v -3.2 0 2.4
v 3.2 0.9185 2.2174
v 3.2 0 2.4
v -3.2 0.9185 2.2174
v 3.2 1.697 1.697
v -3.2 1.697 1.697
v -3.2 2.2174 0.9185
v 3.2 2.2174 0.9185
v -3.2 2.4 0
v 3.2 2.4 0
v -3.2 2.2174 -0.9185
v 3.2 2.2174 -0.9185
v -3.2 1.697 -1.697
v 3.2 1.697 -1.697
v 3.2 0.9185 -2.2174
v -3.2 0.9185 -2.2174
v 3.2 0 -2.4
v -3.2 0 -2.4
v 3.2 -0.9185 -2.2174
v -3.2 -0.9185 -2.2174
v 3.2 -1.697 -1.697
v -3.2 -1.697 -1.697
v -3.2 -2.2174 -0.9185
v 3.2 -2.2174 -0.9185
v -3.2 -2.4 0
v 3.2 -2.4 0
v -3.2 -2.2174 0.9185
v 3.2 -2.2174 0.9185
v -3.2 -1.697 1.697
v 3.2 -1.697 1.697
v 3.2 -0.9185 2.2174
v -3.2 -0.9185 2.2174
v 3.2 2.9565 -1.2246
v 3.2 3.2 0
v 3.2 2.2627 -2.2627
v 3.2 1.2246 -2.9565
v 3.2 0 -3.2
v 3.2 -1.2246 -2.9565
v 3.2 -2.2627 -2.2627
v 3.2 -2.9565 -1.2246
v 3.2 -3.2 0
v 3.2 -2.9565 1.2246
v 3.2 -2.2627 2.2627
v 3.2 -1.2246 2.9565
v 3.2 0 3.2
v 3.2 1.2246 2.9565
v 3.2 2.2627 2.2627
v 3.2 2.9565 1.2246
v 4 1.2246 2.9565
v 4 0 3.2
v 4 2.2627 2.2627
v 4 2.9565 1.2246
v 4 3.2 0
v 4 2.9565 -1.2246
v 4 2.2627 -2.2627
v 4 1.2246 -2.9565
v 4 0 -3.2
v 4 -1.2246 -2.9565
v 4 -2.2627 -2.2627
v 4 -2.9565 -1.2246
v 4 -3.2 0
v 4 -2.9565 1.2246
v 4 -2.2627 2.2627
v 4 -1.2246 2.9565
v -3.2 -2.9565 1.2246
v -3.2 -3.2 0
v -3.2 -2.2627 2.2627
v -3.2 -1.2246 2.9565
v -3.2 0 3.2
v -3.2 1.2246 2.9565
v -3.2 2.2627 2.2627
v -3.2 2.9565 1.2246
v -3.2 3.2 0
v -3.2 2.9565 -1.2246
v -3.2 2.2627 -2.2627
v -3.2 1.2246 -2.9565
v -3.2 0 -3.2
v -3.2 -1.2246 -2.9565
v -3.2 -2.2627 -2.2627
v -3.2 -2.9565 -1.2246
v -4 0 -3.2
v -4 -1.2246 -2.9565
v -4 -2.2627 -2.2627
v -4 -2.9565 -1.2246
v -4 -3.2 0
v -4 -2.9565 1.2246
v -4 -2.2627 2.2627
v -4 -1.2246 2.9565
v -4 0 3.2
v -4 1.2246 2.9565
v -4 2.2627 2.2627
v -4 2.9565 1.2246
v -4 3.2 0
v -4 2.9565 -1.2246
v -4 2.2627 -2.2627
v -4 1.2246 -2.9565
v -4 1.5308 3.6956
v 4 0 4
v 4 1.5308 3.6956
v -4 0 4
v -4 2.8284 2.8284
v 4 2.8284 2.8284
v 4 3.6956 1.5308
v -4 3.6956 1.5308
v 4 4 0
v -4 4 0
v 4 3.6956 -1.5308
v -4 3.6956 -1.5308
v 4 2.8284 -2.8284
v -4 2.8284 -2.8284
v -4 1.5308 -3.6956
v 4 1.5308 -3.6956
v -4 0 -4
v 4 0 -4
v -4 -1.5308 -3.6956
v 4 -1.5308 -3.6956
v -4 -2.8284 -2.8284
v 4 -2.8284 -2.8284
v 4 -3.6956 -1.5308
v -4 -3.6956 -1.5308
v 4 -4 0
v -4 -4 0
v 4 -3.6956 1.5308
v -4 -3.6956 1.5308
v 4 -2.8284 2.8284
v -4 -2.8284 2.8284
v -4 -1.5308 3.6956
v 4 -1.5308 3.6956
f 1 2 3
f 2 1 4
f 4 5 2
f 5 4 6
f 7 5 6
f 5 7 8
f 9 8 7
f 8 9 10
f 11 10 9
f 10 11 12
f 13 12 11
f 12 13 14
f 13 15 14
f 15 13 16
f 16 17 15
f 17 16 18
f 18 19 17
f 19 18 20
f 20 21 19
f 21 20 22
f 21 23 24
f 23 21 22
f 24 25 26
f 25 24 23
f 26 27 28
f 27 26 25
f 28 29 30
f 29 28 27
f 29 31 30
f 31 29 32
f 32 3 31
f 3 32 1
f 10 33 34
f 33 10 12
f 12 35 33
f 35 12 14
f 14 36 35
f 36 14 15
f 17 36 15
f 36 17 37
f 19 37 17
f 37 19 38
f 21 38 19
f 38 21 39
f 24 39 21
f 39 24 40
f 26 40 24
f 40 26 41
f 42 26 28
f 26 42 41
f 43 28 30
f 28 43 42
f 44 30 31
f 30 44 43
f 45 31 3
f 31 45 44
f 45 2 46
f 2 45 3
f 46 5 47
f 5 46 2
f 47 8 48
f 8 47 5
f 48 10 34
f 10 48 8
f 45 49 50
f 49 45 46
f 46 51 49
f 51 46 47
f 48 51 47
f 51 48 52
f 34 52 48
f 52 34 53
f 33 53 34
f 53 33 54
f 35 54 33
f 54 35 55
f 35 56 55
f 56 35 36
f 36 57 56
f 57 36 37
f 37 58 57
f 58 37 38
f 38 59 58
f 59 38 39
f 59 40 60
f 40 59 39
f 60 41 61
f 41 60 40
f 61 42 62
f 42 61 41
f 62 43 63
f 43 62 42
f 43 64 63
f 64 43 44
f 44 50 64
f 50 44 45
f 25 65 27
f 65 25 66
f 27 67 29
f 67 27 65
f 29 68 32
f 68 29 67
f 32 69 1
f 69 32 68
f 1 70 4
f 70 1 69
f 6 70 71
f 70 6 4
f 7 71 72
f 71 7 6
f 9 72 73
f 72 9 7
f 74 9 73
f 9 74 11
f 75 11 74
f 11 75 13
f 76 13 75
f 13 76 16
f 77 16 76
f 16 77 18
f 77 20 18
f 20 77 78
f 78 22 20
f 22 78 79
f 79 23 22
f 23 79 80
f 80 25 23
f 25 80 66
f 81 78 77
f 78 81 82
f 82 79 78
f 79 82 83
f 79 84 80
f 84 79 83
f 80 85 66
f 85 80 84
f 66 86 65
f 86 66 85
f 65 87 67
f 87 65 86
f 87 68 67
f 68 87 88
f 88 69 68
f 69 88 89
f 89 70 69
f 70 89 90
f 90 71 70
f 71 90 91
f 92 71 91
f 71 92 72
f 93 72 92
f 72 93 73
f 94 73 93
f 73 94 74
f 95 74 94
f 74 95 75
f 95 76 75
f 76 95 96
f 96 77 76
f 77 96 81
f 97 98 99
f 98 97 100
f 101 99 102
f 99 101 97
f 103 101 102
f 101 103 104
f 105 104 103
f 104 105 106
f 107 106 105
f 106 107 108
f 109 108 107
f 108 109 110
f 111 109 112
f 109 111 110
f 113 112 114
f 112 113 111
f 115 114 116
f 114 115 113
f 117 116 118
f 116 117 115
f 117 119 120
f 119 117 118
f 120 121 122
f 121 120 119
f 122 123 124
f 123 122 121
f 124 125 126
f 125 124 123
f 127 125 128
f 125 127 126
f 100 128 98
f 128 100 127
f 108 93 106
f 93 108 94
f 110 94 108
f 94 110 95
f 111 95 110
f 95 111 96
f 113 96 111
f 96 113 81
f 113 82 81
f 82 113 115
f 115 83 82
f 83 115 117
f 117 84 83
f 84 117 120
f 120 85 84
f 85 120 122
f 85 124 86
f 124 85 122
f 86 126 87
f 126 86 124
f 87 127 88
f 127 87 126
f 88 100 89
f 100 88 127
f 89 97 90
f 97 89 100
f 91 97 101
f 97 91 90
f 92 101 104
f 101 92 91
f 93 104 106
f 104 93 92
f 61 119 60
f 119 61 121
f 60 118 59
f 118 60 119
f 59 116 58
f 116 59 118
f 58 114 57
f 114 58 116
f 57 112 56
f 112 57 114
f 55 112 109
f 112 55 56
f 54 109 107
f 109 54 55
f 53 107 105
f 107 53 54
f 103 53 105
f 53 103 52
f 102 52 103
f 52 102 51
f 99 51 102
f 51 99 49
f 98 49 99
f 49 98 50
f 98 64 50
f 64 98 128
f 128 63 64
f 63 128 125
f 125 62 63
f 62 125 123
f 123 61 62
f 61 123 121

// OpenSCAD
// file: ../../p/4-4ring4.scad
use <../lib.scad>
function ldraw_lib__4_4ring4() = [
// 0 Ring  4 x 1.0
// 0 Name: 4-4ring4.dat
// 0 Author: James Jessiman
// 0 !LDRAW_ORG Primitive UPDATE 2009-01
// 0 !LICENSE Licensed under CC BY 2.0 and CC BY 4.0 : see CAreadme.txt
// 
// 0 BFC CERTIFY CCW
  [0,"BFC","CERTIFY"],
  [0,"BFC","CCW"],
// 
// 0 !HISTORY 1998-12-15 [PTadmin] Official Update 1998-10
// 0 !HISTORY 2002-04-08 [BrickCaster] Modified for BFC compliance
// 0 !HISTORY 2002-04-25 [PTadmin] Official Update 2002-02
// 0 !HISTORY 2007-06-24 [PTadmin] Header formatted for Contributor Agreement
// 0 !HISTORY 2008-07-01 [PTadmin] Official Update 2008-01
// 0 !HISTORY 2008-08-26 [cwdee] Switch polygon winding and rename
// 0 !HISTORY 2009-05-02 [PTadmin] Official Update 2009-01
// 
// 
// 4 16 -1.9135 0 4.6195 -1.5308 0 3.6956 0 0 4 0 0 5
  [4,16,-1.9135,0,4.6195,-1.5308,0,3.6956,0,0,4,0,0,5],
// 4 16 -3.5355 0 3.5355 -2.8284 0 2.8284 -1.5308 0 3.6956 -1.9135 0 4.6195
  [4,16,-3.5355,0,3.5355,-2.8284,0,2.8284,-1.5308,0,3.6956,-1.9135,0,4.6195],
// 4 16 -4.6195 0 1.9135 -3.6956 0 1.5308 -2.8284 0 2.8284 -3.5355 0 3.5355
  [4,16,-4.6195,0,1.9135,-3.6956,0,1.5308,-2.8284,0,2.8284,-3.5355,0,3.5355],
// 4 16 -5 0 0 -4 0 0 -3.6956 0 1.5308 -4.6195 0 1.9135
  [4,16,-5,0,0,-4,0,0,-3.6956,0,1.5308,-4.6195,0,1.9135],
// 4 16 -4.6195 0 -1.9135 -3.6956 0 -1.5308 -4 0 0 -5 0 0
  [4,16,-4.6195,0,-1.9135,-3.6956,0,-1.5308,-4,0,0,-5,0,0],
// 4 16 -3.5355 0 -3.5355 -2.8284 0 -2.8284 -3.6956 0 -1.5308 -4.6195 0 -1.9135
  [4,16,-3.5355,0,-3.5355,-2.8284,0,-2.8284,-3.6956,0,-1.5308,-4.6195,0,-1.9135],
// 4 16 -1.9135 0 -4.6195 -1.5308 0 -3.6956 -2.8284 0 -2.8284 -3.5355 0 -3.5355
  [4,16,-1.9135,0,-4.6195,-1.5308,0,-3.6956,-2.8284,0,-2.8284,-3.5355,0,-3.5355],
// 4 16 0 0 -5 0 0 -4 -1.5308 0 -3.6956 -1.9135 0 -4.6195
  [4,16,0,0,-5,0,0,-4,-1.5308,0,-3.6956,-1.9135,0,-4.6195],
// 4 16 1.9135 0 -4.6195 1.5308 0 -3.6956 0 0 -4 0 0 -5
  [4,16,1.9135,0,-4.6195,1.5308,0,-3.6956,0,0,-4,0,0,-5],
// 4 16 3.5355 0 -3.5355 2.8284 0 -2.8284 1.5308 0 -3.6956 1.9135 0 -4.6195
  [4,16,3.5355,0,-3.5355,2.8284,0,-2.8284,1.5308,0,-3.6956,1.9135,0,-4.6195],
// 4 16 4.6195 0 -1.9135 3.6956 0 -1.5308 2.8284 0 -2.8284 3.5355 0 -3.5355
  [4,16,4.6195,0,-1.9135,3.6956,0,-1.5308,2.8284,0,-2.8284,3.5355,0,-3.5355],
// 4 16 5 0 0 4 0 0 3.6956 0 -1.5308 4.6195 0 -1.9135
  [4,16,5,0,0,4,0,0,3.6956,0,-1.5308,4.6195,0,-1.9135],
// 4 16 4.6195 0 1.9135 3.6956 0 1.5308 4 0 0 5 0 0
  [4,16,4.6195,0,1.9135,3.6956,0,1.5308,4,0,0,5,0,0],
// 4 16 3.5355 0 3.5355 2.8284 0 2.8284 3.6956 0 1.5308 4.6195 0 1.9135
  [4,16,3.5355,0,3.5355,2.8284,0,2.8284,3.6956,0,1.5308,4.6195,0,1.9135],
// 4 16 1.9135 0 4.6195 1.5308 0 3.6956 2.8284 0 2.8284 3.5355 0 3.5355
  [4,16,1.9135,0,4.6195,1.5308,0,3.6956,2.8284,0,2.8284,3.5355,0,3.5355],
// 4 16 0 0 5 0 0 4 1.5308 0 3.6956 1.9135 0 4.6195
  [4,16,0,0,5,0,0,4,1.5308,0,3.6956,1.9135,0,4.6195],
// 0
];
makepoly(ldraw_lib__4_4ring4(), line=0.2);
// file: ../../p/4-4ring3.scad
use <../lib.scad>
function ldraw_lib__4_4ring3() = [
// 0 Ring  3 x 1.0
// 0 Name: 4-4ring3.dat
// 0 Author: James Jessiman
// 0 !LDRAW_ORG Primitive UPDATE 2009-01
// 0 !LICENSE Licensed under CC BY 2.0 and CC BY 4.0 : see CAreadme.txt
// 
// 0 BFC CERTIFY CCW
  [0,"BFC","CERTIFY"],
  [0,"BFC","CCW"],
// 
// 0 !HISTORY 1998-12-15 [PTadmin] Official Update 1998-10
// 0 !HISTORY 2002-04-05 [hafhead] Added BFC statement
// 0 !HISTORY 2002-04-25 [PTadmin] Official Update 2002-02
// 0 !HISTORY 2007-06-24 [PTadmin] Header formatted for Contributor Agreement
// 0 !HISTORY 2008-07-01 [PTadmin] Official Update 2008-01
// 0 !HISTORY 2008-08-26 [cwdee] Switch polygon winding and rename
// 0 !HISTORY 2009-05-02 [PTadmin] Official Update 2009-01
// 
// 
// 4 16 -1.5308 0 3.6956 -1.1481 0 2.7717 0 0 3 0 0 4
  [4,16,-1.5308,0,3.6956,-1.1481,0,2.7717,0,0,3,0,0,4],
// 4 16 -2.8284 0 2.8284 -2.1213 0 2.1213 -1.1481 0 2.7717 -1.5308 0 3.6956
  [4,16,-2.8284,0,2.8284,-2.1213,0,2.1213,-1.1481,0,2.7717,-1.5308,0,3.6956],
// 4 16 -3.6956 0 1.5308 -2.7717 0 1.1481 -2.1213 0 2.1213 -2.8284 0 2.8284
  [4,16,-3.6956,0,1.5308,-2.7717,0,1.1481,-2.1213,0,2.1213,-2.8284,0,2.8284],
// 4 16 -4 0 0 -3 0 0 -2.7717 0 1.1481 -3.6956 0 1.5308
  [4,16,-4,0,0,-3,0,0,-2.7717,0,1.1481,-3.6956,0,1.5308],
// 4 16 -3.6956 0 -1.5308 -2.7717 0 -1.1481 -3 0 0 -4 0 0
  [4,16,-3.6956,0,-1.5308,-2.7717,0,-1.1481,-3,0,0,-4,0,0],
// 4 16 -2.8284 0 -2.8284 -2.1213 0 -2.1213 -2.7717 0 -1.1481 -3.6956 0 -1.5308
  [4,16,-2.8284,0,-2.8284,-2.1213,0,-2.1213,-2.7717,0,-1.1481,-3.6956,0,-1.5308],
// 4 16 -1.5308 0 -3.6956 -1.1481 0 -2.7717 -2.1213 0 -2.1213 -2.8284 0 -2.8284
  [4,16,-1.5308,0,-3.6956,-1.1481,0,-2.7717,-2.1213,0,-2.1213,-2.8284,0,-2.8284],
// 4 16 0 0 -4 0 0 -3 -1.1481 0 -2.7717 -1.5308 0 -3.6956
  [4,16,0,0,-4,0,0,-3,-1.1481,0,-2.7717,-1.5308,0,-3.6956],
// 4 16 1.5308 0 -3.6956 1.1481 0 -2.7717 0 0 -3 0 0 -4
  [4,16,1.5308,0,-3.6956,1.1481,0,-2.7717,0,0,-3,0,0,-4],
// 4 16 2.8284 0 -2.8284 2.1213 0 -2.1213 1.1481 0 -2.7717 1.5308 0 -3.6956
  [4,16,2.8284,0,-2.8284,2.1213,0,-2.1213,1.1481,0,-2.7717,1.5308,0,-3.6956],
// 4 16 3.6956 0 -1.5308 2.7717 0 -1.1481 2.1213 0 -2.1213 2.8284 0 -2.8284
  [4,16,3.6956,0,-1.5308,2.7717,0,-1.1481,2.1213,0,-2.1213,2.8284,0,-2.8284],
// 4 16 4 0 0 3 0 0 2.7717 0 -1.1481 3.6956 0 -1.5308
  [4,16,4,0,0,3,0,0,2.7717,0,-1.1481,3.6956,0,-1.5308],
// 4 16 3.6956 0 1.5308 2.7717 0 1.1481 3 0 0 4 0 0
  [4,16,3.6956,0,1.5308,2.7717,0,1.1481,3,0,0,4,0,0],
// 4 16 2.8284 0 2.8284 2.1213 0 2.1213 2.7717 0 1.1481 3.6956 0 1.5308
  [4,16,2.8284,0,2.8284,2.1213,0,2.1213,2.7717,0,1.1481,3.6956,0,1.5308],
// 4 16 1.5308 0 3.6956 1.1481 0 2.7717 2.1213 0 2.1213 2.8284 0 2.8284
  [4,16,1.5308,0,3.6956,1.1481,0,2.7717,2.1213,0,2.1213,2.8284,0,2.8284],
// 4 16 0 0 4 0 0 3 1.1481 0 2.7717 1.5308 0 3.6956
  [4,16,0,0,4,0,0,3,1.1481,0,2.7717,1.5308,0,3.6956],
// 0
];
makepoly(ldraw_lib__4_4ring3(), line=0.2);
// file: ../../p/ring4.scad
use <../lib.scad>
use <4-4ring4.scad>
function ldraw_lib__ring4() = [
// 0 ~Moved to 4-4ring4
// 0 Name: ring4.dat
// 0 Author: [PTadmin]
// 0 !LDRAW_ORG Primitive UPDATE 2009-01
// 0 !LICENSE Licensed under CC BY 4.0 : see CAreadme.txt
// 
// 0 BFC CERTIFY CCW
  [0,"BFC","CERTIFY"],
  [0,"BFC","CCW"],
// 
// 0 !HISTORY 2009-05-02 [PTadmin] Official Update 2009-01
// 
// 
// 0 // Ring 4 x 1.0
// 
// 1 16 0 0 0 1 0 0 0 1 0 0 0 1 4-4ring4.dat
  [1,16,0,0,0,1,0,0,0,1,0,0,0,1, ldraw_lib__4_4ring4()],
];
makepoly(ldraw_lib__ring4(), line=0.2);
// file: ../../p/peghole.scad
use <../lib.scad>
use <4-4cyli.scad>
use <4-4edge.scad>
use <4-4ring3.scad>
function ldraw_lib__peghole() = [
// 0 Peg Hole End
// 0 Name: peghole.dat
// 0 Author: James Jessiman
// 0 !LDRAW_ORG Primitive UPDATE 2010-01
// 0 !LICENSE Licensed under CC BY 2.0 and CC BY 4.0 : see CAreadme.txt
// 
// 0 BFC CERTIFY CCW
  [0,"BFC","CERTIFY"],
  [0,"BFC","CCW"],
// 
// 0 !HISTORY 2002-05-01 [mkennedy] replace code with ring3
// 0 !HISTORY 2002-05-01 [sbliss] BFC
// 0 !HISTORY 2002-06-11 [PTadmin] Official Update 2002-03
// 0 !HISTORY 2007-06-24 [PTadmin] Header formatted for Contributor Agreement
// 0 !HISTORY 2008-07-01 [PTadmin] Official Update 2008-01
// 0 !HISTORY 2010-01-14 [cwdee] Update ring3 to 4-4ring3
// 0 !HISTORY 2010-04-05 [PTadmin] Official Update 2010-01
// 
// 
// 1 16 0 0 0 8 0 0 0 1 0 0 0 8 4-4edge.dat
  [1,16,0,0,0,8,0,0,0,1,0,0,0,8, ldraw_lib__4_4edge()],
// 1 16 0 2 0 8 0 0 0 1 0 0 0 8 4-4edge.dat
  [1,16,0,2,0,8,0,0,0,1,0,0,0,8, ldraw_lib__4_4edge()],
// 1 16 0 2 0 6 0 0 0 1 0 0 0 6 4-4edge.dat
  [1,16,0,2,0,6,0,0,0,1,0,0,0,6, ldraw_lib__4_4edge()],
// 1 16 0 2 0 2 0 0 0 1 0 0 0 2 4-4ring3.dat
  [1,16,0,2,0,2,0,0,0,1,0,0,0,2, ldraw_lib__4_4ring3()],
// 0 BFC INVERTNEXT
  [0,"BFC","INVERTNEXT"],
// 1 16 0 0 0 8 0 0 0 2 0 0 0 8 4-4cyli.dat
  [1,16,0,0,0,8,0,0,0,2,0,0,0,8, ldraw_lib__4_4cyli()],
// 0
];
makepoly(ldraw_lib__peghole(), line=0.2);
// file: ../../p/4-4edge.scad
use <../lib.scad>
function ldraw_lib__4_4edge() = [
// 0 Circle 1.0
// 0 Name: 4-4edge.dat
// 0 Author: James Jessiman
// 0 !LDRAW_ORG Primitive UPDATE 2017-01
// 0 !LICENSE Licensed under CC BY 2.0 and CC BY 4.0 : see CAreadme.txt
// 
// 0 BFC CERTIFY CCW
  [0,"BFC","CERTIFY"],
  [0,"BFC","CCW"],
// 
// 0 !HISTORY 1998-12-15 [PTadmin] Official Update 1998-10
// 0 !HISTORY 2005-12-28 [PTadmin] Official Update 2005-01
// 0 !HISTORY 2007-06-24 [PTadmin] Header formatted for Contributor Agreement
// 0 !HISTORY 2008-07-01 [PTadmin] Official Update 2008-01
// 0 !HISTORY 2017-01-15 [Steffen] BFCed
// 0 !HISTORY 2017-12-30 [PTadmin] Official Update 2017-01
// 
// 
// 2 24 1 0 0 0.9239 0 0.3827
  [2,24,1,0,0,0.9239,0,0.3827],
// 2 24 0.9239 0 0.3827 0.7071 0 0.7071
  [2,24,0.9239,0,0.3827,0.7071,0,0.7071],
// 2 24 0.7071 0 0.7071 0.3827 0 0.9239
  [2,24,0.7071,0,0.7071,0.3827,0,0.9239],
// 2 24 0.3827 0 0.9239 0 0 1
  [2,24,0.3827,0,0.9239,0,0,1],
// 2 24 0 0 1 -0.3827 0 0.9239
  [2,24,0,0,1,-0.3827,0,0.9239],
// 2 24 -0.3827 0 0.9239 -0.7071 0 0.7071
  [2,24,-0.3827,0,0.9239,-0.7071,0,0.7071],
// 2 24 -0.7071 0 0.7071 -0.9239 0 0.3827
  [2,24,-0.7071,0,0.7071,-0.9239,0,0.3827],
// 2 24 -0.9239 0 0.3827 -1 0 -0
  [2,24,-0.9239,0,0.3827,-1,0,-0],
// 2 24 -1 0 -0 -0.9239 0 -0.3827
  [2,24,-1,0,-0,-0.9239,0,-0.3827],
// 2 24 -0.9239 0 -0.3827 -0.7071 0 -0.7071
  [2,24,-0.9239,0,-0.3827,-0.7071,0,-0.7071],
// 2 24 -0.7071 0 -0.7071 -0.3827 0 -0.9239
  [2,24,-0.7071,0,-0.7071,-0.3827,0,-0.9239],
// 2 24 -0.3827 0 -0.9239 0 0 -1
  [2,24,-0.3827,0,-0.9239,0,0,-1],
// 2 24 0 0 -1 0.3827 0 -0.9239
  [2,24,0,0,-1,0.3827,0,-0.9239],
// 2 24 0.3827 0 -0.9239 0.7071 0 -0.7071
  [2,24,0.3827,0,-0.9239,0.7071,0,-0.7071],
// 2 24 0.7071 0 -0.7071 0.9239 0 -0.3827
  [2,24,0.7071,0,-0.7071,0.9239,0,-0.3827],
// 2 24 0.9239 0 -0.3827 1 0 0
  [2,24,0.9239,0,-0.3827,1,0,0],
];
makepoly(ldraw_lib__4_4edge(), line=0.2);
// file: ../../p/4-4cyli.scad
use <../lib.scad>
function ldraw_lib__4_4cyli() = [
// 0 Cylinder 1.0
// 0 Name: 4-4cyli.dat
// 0 Author: James Jessiman
// 0 !LDRAW_ORG Primitive UPDATE 2005-01
// 0 !LICENSE Licensed under CC BY 2.0 and CC BY 4.0 : see CAreadme.txt
// 
// 0 BFC CERTIFY CCW
  [0,"BFC","CERTIFY"],
  [0,"BFC","CCW"],
// 
// 0 !HISTORY 1998-12-15 [PTadmin] Official Update 1998-10
// 0 !HISTORY 2002-03-23 [sbliss] Added BFC statement; merged headers from files in distributions LDraw 0.27 and Complete.
// 0 !HISTORY 2002-04-25 [PTadmin] Official Update 2002-02
// 0 !HISTORY 2004-12-14 [guyvivan] BFC CCW
// 0 !HISTORY 2005-12-28 [PTadmin] Official Update 2005-01
// 0 !HISTORY 2007-06-24 [PTadmin] Header formatted for Contributor Agreement
// 0 !HISTORY 2008-07-01 [PTadmin] Official Update 2008-01
// 
// 
// 4 16 1 1 0 0.9239 1 0.3827 0.9239 0 0.3827 1 0 0
  [4,16,1,1,0,0.9239,1,0.3827,0.9239,0,0.3827,1,0,0],
// 5 24 1 0 0 1 1 0 0.9239 0 0.3827 0.9239 0 -0.3827
  [5,24,1,0,0,1,1,0,0.9239,0,0.3827,0.9239,0,-0.3827],
// 4 16 0.9239 1 0.3827 0.7071 1 0.7071 0.7071 0 0.7071 0.9239 0 0.3827
  [4,16,0.9239,1,0.3827,0.7071,1,0.7071,0.7071,0,0.7071,0.9239,0,0.3827],
// 5 24 0.9239 0 0.3827 0.9239 1 0.3827 0.7071 0 0.7071 1 0 0
  [5,24,0.9239,0,0.3827,0.9239,1,0.3827,0.7071,0,0.7071,1,0,0],
// 4 16 0.7071 1 0.7071 0.3827 1 0.9239 0.3827 0 0.9239 0.7071 0 0.7071
  [4,16,0.7071,1,0.7071,0.3827,1,0.9239,0.3827,0,0.9239,0.7071,0,0.7071],
// 5 24 0.7071 0 0.7071 0.7071 1 0.7071 0.3827 0 0.9239 0.9239 0 0.3827
  [5,24,0.7071,0,0.7071,0.7071,1,0.7071,0.3827,0,0.9239,0.9239,0,0.3827],
// 4 16 0.3827 1 0.9239 0 1 1 0 0 1 0.3827 0 0.9239
  [4,16,0.3827,1,0.9239,0,1,1,0,0,1,0.3827,0,0.9239],
// 5 24 0.3827 0 0.9239 0.3827 1 0.9239 0 0 1 0.7071 0 0.7071
  [5,24,0.3827,0,0.9239,0.3827,1,0.9239,0,0,1,0.7071,0,0.7071],
// 4 16 0 1 1 -0.3827 1 0.9239 -0.3827 0 0.9239 0 0 1
  [4,16,0,1,1,-0.3827,1,0.9239,-0.3827,0,0.9239,0,0,1],
// 5 24 0 0 1 0 1 1 -0.3827 0 0.9239 0.3827 0 0.9239
  [5,24,0,0,1,0,1,1,-0.3827,0,0.9239,0.3827,0,0.9239],
// 4 16 -0.3827 1 0.9239 -0.7071 1 0.7071 -0.7071 0 0.7071 -0.3827 0 0.9239
  [4,16,-0.3827,1,0.9239,-0.7071,1,0.7071,-0.7071,0,0.7071,-0.3827,0,0.9239],
// 5 24 -0.3827 0 0.9239 -0.3827 1 0.9239 -0.7071 0 0.7071 0 0 1
  [5,24,-0.3827,0,0.9239,-0.3827,1,0.9239,-0.7071,0,0.7071,0,0,1],
// 4 16 -0.7071 1 0.7071 -0.9239 1 0.3827 -0.9239 0 0.3827 -0.7071 0 0.7071
  [4,16,-0.7071,1,0.7071,-0.9239,1,0.3827,-0.9239,0,0.3827,-0.7071,0,0.7071],
// 5 24 -0.7071 0 0.7071 -0.7071 1 0.7071 -0.9239 0 0.3827 -0.3827 0 0.9239
  [5,24,-0.7071,0,0.7071,-0.7071,1,0.7071,-0.9239,0,0.3827,-0.3827,0,0.9239],
// 4 16 -0.9239 1 0.3827 -1 1 0 -1 0 0 -0.9239 0 0.3827
  [4,16,-0.9239,1,0.3827,-1,1,0,-1,0,0,-0.9239,0,0.3827],
// 5 24 -0.9239 0 0.3827 -0.9239 1 0.3827 -1 0 0 -0.7071 0 0.7071
  [5,24,-0.9239,0,0.3827,-0.9239,1,0.3827,-1,0,0,-0.7071,0,0.7071],
// 4 16 -1 1 0 -0.9239 1 -0.3827 -0.9239 0 -0.3827 -1 0 0
  [4,16,-1,1,0,-0.9239,1,-0.3827,-0.9239,0,-0.3827,-1,0,0],
// 5 24 -1 0 0 -1 1 0 -0.9239 0 -0.3827 -0.9239 0 0.3827
  [5,24,-1,0,0,-1,1,0,-0.9239,0,-0.3827,-0.9239,0,0.3827],
// 4 16 -0.9239 1 -0.3827 -0.7071 1 -0.7071 -0.7071 0 -0.7071 -0.9239 0 -0.3827
  [4,16,-0.9239,1,-0.3827,-0.7071,1,-0.7071,-0.7071,0,-0.7071,-0.9239,0,-0.3827],
// 5 24 -0.9239 0 -0.3827 -0.9239 1 -0.3827 -0.7071 0 -0.7071 -1 0 0
  [5,24,-0.9239,0,-0.3827,-0.9239,1,-0.3827,-0.7071,0,-0.7071,-1,0,0],
// 4 16 -0.7071 1 -0.7071 -0.3827 1 -0.9239 -0.3827 0 -0.9239 -0.7071 0 -0.7071
  [4,16,-0.7071,1,-0.7071,-0.3827,1,-0.9239,-0.3827,0,-0.9239,-0.7071,0,-0.7071],
// 5 24 -0.7071 0 -0.7071 -0.7071 1 -0.7071 -0.3827 0 -0.9239 -0.9239 0 -0.3827
  [5,24,-0.7071,0,-0.7071,-0.7071,1,-0.7071,-0.3827,0,-0.9239,-0.9239,0,-0.3827],
// 4 16 -0.3827 1 -0.9239 0 1 -1 0 0 -1 -0.3827 0 -0.9239
  [4,16,-0.3827,1,-0.9239,0,1,-1,0,0,-1,-0.3827,0,-0.9239],
// 5 24 -0.3827 0 -0.9239 -0.3827 1 -0.9239 0 0 -1 -0.7071 0 -0.7071
  [5,24,-0.3827,0,-0.9239,-0.3827,1,-0.9239,0,0,-1,-0.7071,0,-0.7071],
// 4 16 0 1 -1 0.3827 1 -0.9239 0.3827 0 -0.9239 0 0 -1
  [4,16,0,1,-1,0.3827,1,-0.9239,0.3827,0,-0.9239,0,0,-1],
// 5 24 0 0 -1 0 1 -1 0.3827 0 -0.9239 -0.3827 0 -0.9239
  [5,24,0,0,-1,0,1,-1,0.3827,0,-0.9239,-0.3827,0,-0.9239],
// 4 16 0.3827 1 -0.9239 0.7071 1 -0.7071 0.7071 0 -0.7071 0.3827 0 -0.9239
  [4,16,0.3827,1,-0.9239,0.7071,1,-0.7071,0.7071,0,-0.7071,0.3827,0,-0.9239],
// 5 24 0.3827 0 -0.9239 0.3827 1 -0.9239 0.7071 0 -0.7071 0 0 -1
  [5,24,0.3827,0,-0.9239,0.3827,1,-0.9239,0.7071,0,-0.7071,0,0,-1],
// 4 16 0.7071 1 -0.7071 0.9239 1 -0.3827 0.9239 0 -0.3827 0.7071 0 -0.7071
  [4,16,0.7071,1,-0.7071,0.9239,1,-0.3827,0.9239,0,-0.3827,0.7071,0,-0.7071],
// 5 24 0.7071 0 -0.7071 0.7071 1 -0.7071 0.9239 0 -0.3827 0.3827 0 -0.9239
  [5,24,0.7071,0,-0.7071,0.7071,1,-0.7071,0.9239,0,-0.3827,0.3827,0,-0.9239],
// 4 16 0.9239 1 -0.3827 1 1 0 1 0 0 0.9239 0 -0.3827
  [4,16,0.9239,1,-0.3827,1,1,0,1,0,0,0.9239,0,-0.3827],
// 5 24 0.9239 0 -0.3827 0.9239 1 -0.3827 1 0 0 0.7071 0 -0.7071
  [5,24,0.9239,0,-0.3827,0.9239,1,-0.3827,1,0,0,0.7071,0,-0.7071],
// 0
];
makepoly(ldraw_lib__4_4cyli(), line=0.2);
// main file
use <../../lib.scad>
use <../../p/4-4cyli.scad>
use <../../p/4-4edge.scad>
use <../../p/peghole.scad>
use <../../p/ring4.scad>
function ldraw_lib__s__921a() = [
// 0 ~Technic Axle Connector Center
// 0 Name: s\921a.dat
// 0 Author: Lutz Uhlmann [El-Lutzo]
// 0 !LDRAW_ORG Subpart UPDATE 2004-04
// 0 !LICENSE Licensed under CC BY 2.0 and CC BY 4.0 : see CAreadme.txt
// 
// 0 BFC CERTIFY CCW
  [0,"BFC","CERTIFY"],
  [0,"BFC","CCW"],
// 
// 0 !HISTORY 1998-10-15 [PTadmin] Official Update 1998-09
// 0 !HISTORY 2003-06-09 [jriley] BFC compliant, ring substitutions
// 0 !HISTORY 2004-04-22 [PTadmin] Official Update 2004-02
// 0 !HISTORY 2004-07-10 [guyvivan] Use Peghole primitive
// 0 !HISTORY 2004-11-06 [PTadmin] Official Update 2004-04
// 0 !HISTORY 2007-09-10 [PTadmin] Header formatted for Contributor Agreement
// 0 !HISTORY 2008-07-01 [PTadmin] Official Update 2008-01
// 
// 
// 0 BFC INVERTNEXT
  [0,"BFC","INVERTNEXT"],
// 1 16 8 0 0 0 -16 0 -6 0 0 0 0 6 4-4cyli.dat
  [1,16,8,0,0,0,-16,0,-6,0,0,0,0,6, ldraw_lib__4_4cyli()],
// 1 16 10 0 0 0 -1 0 -1 0 0 0 0 1 peghole.dat
  [1,16,10,0,0,0,-1,0,-1,0,0,0,0,1, ldraw_lib__peghole()],
// 1 16 -10 0 0 0 1 0 1 0 0 0 0 -1 peghole.dat
  [1,16,-10,0,0,0,1,0,1,0,0,0,0,-1, ldraw_lib__peghole()],
// 1 16 10 0 0 0 -20 0 -10 0 0 0 0 10 4-4cyli.dat
  [1,16,10,0,0,0,-20,0,-10,0,0,0,0,10, ldraw_lib__4_4cyli()],
// 1 16 10 0 0 0 1 0 -10 0 0 0 0 10 4-4edge.dat
  [1,16,10,0,0,0,1,0,-10,0,0,0,0,10, ldraw_lib__4_4edge()],
// 1 16 -10 0 0 0 1 0 -10 0 0 0 0 10 4-4edge.dat
  [1,16,-10,0,0,0,1,0,-10,0,0,0,0,10, ldraw_lib__4_4edge()],
// 1 16 -10 0 0 0 1 0 -2 0 0 0 0 2 ring4.dat
  [1,16,-10,0,0,0,1,0,-2,0,0,0,0,2, ldraw_lib__ring4()],
// 1 16 10 0 0 0 -1 0 -2 0 0 0 0 -2 ring4.dat
  [1,16,10,0,0,0,-1,0,-2,0,0,0,0,-2, ldraw_lib__ring4()],
// 0
// 
];
makepoly(ldraw_lib__s__921a(), line=0.2);
